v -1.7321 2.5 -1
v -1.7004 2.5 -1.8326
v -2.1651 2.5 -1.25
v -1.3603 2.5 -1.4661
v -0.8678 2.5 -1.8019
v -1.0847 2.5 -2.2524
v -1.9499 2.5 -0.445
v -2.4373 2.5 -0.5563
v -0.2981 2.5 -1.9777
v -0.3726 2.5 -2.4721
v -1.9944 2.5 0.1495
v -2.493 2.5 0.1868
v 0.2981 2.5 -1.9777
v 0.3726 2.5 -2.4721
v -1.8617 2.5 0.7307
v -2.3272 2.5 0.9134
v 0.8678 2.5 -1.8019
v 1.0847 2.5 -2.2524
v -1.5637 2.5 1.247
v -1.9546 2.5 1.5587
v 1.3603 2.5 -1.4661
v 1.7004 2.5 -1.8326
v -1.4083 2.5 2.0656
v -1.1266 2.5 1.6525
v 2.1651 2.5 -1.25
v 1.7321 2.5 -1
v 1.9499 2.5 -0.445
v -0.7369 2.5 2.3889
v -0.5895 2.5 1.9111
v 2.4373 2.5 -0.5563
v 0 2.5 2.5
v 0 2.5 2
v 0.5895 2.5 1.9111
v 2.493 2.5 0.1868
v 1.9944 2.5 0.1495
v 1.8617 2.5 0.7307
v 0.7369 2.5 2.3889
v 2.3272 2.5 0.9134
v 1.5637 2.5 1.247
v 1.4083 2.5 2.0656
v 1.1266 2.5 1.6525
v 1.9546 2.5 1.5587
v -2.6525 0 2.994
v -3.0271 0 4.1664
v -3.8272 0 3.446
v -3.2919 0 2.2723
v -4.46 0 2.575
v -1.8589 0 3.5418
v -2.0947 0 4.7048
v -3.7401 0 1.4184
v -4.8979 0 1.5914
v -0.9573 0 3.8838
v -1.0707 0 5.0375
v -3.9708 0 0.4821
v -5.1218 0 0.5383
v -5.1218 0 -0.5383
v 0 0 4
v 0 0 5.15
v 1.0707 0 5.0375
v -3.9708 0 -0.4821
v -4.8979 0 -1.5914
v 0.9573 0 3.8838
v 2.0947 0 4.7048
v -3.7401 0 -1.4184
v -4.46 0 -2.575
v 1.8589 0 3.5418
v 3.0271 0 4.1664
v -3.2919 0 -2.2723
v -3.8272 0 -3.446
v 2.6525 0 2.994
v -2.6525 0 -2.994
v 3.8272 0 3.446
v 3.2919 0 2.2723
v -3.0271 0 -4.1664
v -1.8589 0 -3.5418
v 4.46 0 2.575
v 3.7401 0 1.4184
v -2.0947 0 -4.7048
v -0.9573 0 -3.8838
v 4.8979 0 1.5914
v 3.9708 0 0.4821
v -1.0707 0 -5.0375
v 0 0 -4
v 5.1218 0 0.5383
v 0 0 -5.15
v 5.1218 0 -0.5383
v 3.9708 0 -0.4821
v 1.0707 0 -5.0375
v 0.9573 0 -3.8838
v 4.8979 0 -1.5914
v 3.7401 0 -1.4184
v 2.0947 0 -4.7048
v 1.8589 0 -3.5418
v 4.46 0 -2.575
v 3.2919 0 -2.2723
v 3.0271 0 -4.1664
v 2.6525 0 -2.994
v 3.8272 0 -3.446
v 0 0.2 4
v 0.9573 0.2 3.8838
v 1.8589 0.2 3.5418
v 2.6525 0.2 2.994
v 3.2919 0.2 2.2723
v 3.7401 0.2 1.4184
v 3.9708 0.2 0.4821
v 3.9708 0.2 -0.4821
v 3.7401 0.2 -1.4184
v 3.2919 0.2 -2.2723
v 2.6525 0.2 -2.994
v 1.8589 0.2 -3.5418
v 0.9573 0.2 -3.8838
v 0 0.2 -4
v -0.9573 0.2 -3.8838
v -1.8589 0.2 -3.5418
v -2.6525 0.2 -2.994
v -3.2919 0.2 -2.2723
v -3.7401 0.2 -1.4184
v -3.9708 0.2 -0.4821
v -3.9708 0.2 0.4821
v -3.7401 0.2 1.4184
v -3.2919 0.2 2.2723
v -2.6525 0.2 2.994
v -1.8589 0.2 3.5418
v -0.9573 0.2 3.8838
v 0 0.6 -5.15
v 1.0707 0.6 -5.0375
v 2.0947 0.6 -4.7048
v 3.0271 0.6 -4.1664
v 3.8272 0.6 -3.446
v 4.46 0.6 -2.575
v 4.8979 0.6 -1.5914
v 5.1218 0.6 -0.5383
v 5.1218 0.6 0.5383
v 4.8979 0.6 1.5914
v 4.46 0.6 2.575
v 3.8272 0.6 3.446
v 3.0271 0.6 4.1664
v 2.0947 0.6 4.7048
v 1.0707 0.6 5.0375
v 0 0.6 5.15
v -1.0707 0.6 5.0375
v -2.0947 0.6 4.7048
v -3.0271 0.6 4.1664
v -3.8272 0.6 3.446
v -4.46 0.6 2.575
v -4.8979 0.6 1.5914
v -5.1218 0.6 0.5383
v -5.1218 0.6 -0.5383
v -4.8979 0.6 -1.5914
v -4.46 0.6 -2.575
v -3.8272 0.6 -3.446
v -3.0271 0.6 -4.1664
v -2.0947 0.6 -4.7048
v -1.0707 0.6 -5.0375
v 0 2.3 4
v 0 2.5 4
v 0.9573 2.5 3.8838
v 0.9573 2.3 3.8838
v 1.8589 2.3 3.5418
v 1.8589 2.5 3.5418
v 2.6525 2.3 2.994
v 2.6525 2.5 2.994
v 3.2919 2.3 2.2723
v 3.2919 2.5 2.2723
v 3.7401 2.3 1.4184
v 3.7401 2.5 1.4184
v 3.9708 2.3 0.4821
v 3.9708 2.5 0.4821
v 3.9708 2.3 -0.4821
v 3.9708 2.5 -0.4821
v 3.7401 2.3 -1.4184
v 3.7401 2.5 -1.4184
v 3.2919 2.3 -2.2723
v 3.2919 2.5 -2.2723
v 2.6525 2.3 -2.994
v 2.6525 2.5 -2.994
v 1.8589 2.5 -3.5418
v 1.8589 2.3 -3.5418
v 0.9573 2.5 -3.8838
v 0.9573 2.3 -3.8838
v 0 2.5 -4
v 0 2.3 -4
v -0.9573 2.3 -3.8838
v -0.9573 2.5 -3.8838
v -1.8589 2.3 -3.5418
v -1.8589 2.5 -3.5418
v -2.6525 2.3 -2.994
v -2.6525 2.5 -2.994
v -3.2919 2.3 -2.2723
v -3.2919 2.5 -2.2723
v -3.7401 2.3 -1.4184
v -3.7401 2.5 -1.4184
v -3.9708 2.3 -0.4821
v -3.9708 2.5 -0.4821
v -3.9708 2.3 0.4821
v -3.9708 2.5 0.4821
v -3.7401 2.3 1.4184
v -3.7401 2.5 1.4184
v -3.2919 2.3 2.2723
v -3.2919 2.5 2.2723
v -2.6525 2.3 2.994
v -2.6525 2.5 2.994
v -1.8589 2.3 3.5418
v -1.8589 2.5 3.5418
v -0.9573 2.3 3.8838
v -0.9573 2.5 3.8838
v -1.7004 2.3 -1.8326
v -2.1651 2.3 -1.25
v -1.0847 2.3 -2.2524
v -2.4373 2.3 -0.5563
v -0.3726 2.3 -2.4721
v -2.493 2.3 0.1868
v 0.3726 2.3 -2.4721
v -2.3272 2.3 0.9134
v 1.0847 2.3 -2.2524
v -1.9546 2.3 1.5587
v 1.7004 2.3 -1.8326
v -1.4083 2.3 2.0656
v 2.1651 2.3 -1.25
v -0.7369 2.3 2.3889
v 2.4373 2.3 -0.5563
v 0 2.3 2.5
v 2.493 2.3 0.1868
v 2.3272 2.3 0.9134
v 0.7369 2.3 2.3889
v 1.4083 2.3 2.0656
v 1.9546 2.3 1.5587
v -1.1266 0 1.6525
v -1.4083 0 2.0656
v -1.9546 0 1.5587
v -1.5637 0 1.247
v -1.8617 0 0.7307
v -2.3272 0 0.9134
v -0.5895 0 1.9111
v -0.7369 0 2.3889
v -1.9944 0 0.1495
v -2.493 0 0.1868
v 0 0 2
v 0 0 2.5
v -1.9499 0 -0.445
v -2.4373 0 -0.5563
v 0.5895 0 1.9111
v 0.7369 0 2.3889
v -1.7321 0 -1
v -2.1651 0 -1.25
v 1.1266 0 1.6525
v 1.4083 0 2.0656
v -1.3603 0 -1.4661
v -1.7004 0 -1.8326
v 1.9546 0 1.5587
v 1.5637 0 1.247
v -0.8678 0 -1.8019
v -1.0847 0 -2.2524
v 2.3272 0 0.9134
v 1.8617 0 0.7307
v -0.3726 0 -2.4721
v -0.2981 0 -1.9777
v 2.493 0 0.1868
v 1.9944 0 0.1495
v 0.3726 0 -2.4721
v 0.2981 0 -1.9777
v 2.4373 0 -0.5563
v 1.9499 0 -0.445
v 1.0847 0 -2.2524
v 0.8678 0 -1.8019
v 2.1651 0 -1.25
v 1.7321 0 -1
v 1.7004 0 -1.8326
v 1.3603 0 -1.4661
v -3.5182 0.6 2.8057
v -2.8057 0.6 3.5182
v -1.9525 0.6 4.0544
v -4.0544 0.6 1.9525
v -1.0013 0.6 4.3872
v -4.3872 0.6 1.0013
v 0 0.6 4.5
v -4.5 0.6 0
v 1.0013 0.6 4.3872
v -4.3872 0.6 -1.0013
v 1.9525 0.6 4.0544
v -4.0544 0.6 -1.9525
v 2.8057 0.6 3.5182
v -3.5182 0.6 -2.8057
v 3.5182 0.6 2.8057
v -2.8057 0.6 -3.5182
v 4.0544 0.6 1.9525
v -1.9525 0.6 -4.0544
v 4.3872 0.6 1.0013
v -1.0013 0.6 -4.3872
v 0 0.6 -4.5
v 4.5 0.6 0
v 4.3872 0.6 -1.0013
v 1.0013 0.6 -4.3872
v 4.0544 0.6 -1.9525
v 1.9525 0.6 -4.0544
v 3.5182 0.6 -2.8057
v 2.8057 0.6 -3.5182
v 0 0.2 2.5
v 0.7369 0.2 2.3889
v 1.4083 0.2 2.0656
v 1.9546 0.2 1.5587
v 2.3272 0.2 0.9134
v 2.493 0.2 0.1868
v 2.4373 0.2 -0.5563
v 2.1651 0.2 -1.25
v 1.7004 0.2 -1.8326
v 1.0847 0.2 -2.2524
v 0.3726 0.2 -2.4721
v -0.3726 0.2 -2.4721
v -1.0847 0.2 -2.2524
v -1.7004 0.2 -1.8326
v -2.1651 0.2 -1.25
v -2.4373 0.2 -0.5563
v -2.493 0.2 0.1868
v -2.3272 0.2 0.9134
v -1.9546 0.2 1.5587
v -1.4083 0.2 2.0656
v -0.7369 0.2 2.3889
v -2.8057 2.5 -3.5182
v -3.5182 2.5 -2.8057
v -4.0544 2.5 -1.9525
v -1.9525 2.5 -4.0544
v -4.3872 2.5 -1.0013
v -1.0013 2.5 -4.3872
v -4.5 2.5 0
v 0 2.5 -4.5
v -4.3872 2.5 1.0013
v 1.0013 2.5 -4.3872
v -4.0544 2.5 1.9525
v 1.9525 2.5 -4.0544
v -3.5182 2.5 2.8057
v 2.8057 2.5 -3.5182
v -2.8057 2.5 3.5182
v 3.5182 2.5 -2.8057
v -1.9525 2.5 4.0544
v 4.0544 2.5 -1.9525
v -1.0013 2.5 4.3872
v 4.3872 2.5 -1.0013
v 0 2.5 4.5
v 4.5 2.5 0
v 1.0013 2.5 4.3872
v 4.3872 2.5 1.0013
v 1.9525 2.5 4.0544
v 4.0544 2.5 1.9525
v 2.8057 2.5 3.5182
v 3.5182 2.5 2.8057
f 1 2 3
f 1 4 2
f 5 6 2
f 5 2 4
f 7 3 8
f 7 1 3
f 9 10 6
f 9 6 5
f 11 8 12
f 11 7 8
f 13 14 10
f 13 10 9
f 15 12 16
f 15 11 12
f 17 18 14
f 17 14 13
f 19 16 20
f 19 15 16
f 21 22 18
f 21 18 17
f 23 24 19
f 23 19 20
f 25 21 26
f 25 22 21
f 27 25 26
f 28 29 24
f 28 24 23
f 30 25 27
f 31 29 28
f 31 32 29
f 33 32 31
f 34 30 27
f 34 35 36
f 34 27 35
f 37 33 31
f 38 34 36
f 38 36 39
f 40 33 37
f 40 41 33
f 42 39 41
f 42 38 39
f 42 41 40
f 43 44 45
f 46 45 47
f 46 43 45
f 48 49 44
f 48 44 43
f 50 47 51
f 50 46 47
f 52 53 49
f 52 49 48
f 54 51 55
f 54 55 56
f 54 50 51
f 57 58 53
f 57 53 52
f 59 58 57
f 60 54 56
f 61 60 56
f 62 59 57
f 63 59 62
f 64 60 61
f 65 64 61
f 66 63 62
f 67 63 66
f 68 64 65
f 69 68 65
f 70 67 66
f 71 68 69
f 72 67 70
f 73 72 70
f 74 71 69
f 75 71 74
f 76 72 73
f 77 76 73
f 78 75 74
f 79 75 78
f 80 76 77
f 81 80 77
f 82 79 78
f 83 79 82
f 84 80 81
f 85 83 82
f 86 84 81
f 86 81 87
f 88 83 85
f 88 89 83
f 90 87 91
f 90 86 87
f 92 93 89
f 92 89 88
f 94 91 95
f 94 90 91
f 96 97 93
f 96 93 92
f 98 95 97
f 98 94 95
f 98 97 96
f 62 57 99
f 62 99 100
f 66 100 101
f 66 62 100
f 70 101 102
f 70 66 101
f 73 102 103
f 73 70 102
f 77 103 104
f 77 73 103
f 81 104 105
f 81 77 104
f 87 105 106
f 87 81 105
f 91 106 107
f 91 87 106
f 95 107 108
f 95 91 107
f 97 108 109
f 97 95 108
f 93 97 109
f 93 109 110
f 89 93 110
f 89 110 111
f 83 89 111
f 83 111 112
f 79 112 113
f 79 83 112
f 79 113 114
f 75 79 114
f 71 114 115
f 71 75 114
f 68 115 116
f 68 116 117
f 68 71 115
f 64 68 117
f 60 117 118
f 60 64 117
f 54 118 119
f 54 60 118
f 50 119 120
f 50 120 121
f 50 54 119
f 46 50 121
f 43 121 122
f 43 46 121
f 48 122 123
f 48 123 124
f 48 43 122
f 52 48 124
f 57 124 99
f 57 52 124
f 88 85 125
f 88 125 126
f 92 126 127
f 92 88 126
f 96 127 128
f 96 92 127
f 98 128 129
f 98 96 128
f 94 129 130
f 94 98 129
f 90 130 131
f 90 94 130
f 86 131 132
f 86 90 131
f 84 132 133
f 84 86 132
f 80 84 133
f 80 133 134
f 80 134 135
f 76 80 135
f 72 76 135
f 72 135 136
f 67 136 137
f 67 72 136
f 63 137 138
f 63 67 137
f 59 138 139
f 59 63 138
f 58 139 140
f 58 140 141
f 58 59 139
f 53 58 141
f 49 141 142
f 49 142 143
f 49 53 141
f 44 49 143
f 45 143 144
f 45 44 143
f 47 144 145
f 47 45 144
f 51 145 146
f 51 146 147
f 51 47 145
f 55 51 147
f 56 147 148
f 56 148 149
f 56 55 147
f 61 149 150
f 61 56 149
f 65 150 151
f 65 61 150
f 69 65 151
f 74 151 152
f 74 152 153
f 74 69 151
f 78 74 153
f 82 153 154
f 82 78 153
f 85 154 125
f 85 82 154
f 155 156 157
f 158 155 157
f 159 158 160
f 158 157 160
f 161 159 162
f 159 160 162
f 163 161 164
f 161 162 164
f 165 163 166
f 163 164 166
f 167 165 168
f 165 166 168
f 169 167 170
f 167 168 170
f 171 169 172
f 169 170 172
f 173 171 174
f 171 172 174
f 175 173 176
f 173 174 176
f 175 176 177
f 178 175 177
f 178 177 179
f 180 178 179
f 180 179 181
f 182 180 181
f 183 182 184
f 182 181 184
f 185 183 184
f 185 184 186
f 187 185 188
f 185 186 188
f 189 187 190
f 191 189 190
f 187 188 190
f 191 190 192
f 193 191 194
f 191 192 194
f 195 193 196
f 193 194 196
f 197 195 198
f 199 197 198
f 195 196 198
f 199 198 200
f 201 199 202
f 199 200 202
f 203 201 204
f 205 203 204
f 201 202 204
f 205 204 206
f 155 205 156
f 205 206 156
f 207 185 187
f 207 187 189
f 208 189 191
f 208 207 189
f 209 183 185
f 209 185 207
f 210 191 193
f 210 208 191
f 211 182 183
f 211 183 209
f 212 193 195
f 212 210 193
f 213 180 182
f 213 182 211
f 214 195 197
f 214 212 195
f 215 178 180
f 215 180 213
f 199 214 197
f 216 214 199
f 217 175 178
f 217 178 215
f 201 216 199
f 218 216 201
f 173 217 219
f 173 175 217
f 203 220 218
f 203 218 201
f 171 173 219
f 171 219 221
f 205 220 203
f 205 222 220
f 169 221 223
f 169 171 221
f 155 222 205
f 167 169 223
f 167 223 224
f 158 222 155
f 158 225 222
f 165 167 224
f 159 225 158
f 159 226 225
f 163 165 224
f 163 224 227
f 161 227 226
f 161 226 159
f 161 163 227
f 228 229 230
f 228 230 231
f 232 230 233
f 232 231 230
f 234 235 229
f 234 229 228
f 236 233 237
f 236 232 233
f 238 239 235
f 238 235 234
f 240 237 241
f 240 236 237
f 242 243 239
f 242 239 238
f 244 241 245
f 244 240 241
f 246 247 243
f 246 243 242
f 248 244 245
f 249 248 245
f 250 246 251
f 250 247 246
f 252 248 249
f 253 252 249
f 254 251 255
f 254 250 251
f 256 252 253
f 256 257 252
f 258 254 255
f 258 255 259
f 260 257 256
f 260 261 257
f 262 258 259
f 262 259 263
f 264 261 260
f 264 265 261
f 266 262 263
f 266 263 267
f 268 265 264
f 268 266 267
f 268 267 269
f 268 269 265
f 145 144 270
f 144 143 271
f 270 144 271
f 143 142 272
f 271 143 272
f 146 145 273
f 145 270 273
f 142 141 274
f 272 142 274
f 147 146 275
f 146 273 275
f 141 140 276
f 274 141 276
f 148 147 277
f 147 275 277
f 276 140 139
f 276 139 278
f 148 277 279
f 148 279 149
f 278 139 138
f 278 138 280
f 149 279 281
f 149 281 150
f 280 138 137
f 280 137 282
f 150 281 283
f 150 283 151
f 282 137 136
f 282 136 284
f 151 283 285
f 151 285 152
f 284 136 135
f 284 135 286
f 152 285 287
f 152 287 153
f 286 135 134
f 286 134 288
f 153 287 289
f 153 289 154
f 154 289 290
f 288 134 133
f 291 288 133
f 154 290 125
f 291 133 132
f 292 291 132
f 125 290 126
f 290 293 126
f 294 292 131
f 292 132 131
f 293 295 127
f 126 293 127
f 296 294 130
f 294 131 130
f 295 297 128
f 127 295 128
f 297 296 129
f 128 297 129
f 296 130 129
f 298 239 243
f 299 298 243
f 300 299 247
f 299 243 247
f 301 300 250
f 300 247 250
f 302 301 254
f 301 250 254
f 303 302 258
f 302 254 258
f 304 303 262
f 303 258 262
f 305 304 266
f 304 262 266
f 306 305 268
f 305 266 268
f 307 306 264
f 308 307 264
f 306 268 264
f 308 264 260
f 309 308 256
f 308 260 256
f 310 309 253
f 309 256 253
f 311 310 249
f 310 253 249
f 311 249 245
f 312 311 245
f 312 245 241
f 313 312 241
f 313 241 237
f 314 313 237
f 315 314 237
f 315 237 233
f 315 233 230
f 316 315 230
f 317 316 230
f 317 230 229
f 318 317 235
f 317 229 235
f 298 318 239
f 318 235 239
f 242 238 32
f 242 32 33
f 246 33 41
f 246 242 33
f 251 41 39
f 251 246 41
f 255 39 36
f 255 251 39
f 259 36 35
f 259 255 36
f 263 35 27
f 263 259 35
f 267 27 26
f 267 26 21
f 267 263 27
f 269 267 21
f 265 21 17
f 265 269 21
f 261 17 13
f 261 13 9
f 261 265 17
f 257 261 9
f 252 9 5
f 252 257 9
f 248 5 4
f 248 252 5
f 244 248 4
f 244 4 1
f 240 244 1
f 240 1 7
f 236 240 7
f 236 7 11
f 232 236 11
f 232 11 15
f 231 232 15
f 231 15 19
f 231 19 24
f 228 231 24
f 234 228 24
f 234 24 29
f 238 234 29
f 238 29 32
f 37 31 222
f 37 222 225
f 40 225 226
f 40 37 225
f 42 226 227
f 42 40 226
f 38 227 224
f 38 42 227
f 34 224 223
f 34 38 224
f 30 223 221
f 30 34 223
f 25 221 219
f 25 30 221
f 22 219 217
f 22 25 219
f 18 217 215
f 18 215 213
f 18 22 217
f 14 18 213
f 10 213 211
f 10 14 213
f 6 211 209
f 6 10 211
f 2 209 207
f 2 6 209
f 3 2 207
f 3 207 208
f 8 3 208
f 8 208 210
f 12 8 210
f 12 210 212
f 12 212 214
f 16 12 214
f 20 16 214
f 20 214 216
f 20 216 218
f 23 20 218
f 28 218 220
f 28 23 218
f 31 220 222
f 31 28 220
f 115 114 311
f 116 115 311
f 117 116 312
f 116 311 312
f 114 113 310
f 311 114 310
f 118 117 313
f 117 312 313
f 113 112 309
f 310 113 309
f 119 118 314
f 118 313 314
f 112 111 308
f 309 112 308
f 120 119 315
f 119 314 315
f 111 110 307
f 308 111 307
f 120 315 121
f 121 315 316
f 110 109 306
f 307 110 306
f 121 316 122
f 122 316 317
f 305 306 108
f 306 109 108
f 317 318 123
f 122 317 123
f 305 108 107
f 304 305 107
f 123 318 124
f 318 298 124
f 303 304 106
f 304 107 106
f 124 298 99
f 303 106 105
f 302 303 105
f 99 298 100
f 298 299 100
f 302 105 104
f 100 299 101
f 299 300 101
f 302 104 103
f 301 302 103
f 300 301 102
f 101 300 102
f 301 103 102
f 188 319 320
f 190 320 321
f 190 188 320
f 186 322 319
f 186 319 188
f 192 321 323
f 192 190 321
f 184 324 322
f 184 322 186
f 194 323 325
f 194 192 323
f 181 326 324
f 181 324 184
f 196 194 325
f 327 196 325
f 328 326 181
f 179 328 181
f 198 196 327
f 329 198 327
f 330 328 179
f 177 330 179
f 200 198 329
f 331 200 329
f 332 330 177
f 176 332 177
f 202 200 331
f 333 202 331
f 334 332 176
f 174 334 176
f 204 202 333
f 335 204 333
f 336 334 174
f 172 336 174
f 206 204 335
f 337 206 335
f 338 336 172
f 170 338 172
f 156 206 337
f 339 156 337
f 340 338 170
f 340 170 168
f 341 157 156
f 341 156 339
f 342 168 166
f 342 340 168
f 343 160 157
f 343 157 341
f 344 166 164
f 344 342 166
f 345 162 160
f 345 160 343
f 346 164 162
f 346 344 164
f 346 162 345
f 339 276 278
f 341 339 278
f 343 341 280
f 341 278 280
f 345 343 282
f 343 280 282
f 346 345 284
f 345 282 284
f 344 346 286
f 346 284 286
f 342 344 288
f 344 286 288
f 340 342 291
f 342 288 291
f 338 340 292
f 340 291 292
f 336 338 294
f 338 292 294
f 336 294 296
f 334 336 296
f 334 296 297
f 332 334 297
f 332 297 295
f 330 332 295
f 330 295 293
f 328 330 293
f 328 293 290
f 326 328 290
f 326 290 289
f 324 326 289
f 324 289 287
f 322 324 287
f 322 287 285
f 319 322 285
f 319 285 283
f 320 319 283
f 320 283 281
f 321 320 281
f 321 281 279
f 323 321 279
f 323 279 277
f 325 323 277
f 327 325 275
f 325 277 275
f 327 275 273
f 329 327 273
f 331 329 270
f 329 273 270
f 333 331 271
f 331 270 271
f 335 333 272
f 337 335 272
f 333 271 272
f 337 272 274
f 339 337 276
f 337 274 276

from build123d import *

# Parameters (mm, degrees)
SKETCH_1_R          = 4.5
SKETCH_1_R_2        = 2
EXTRUDE_1_DEPTH     = 2.5
SKETCH_2_R          = 5.15
SKETCH_2_R_2        = 2
EXTRUDE_2_DEPTH     = 0.6
SKETCH_4_R          = 4
SKETCH_4_R_2        = 2.5
CUT_EXTRUDE_1_DEPTH = 0.2


with BuildPart() as part:
    # 草图1 → 凸台-拉伸1 (new body)
    with BuildSketch(Plane(origin=(0, 0, 0), x_dir=(1, 0, 0), z_dir=(0, 1, 0))):
        with Locations(Location((0, 0, 0), (0, 0, 270))):
            Circle(SKETCH_1_R)
        with Locations(Location((0, 0, 0), (0, 0, 270))):
            Circle(SKETCH_1_R_2, mode=Mode.SUBTRACT)
    extrude(amount=EXTRUDE_1_DEPTH)

    # 草图2 → 凸台-拉伸2 (add)
    with BuildSketch(Plane.XZ):
        with Locations(Location((0, 0, 0), (0, 0, 270))):
            Circle(SKETCH_2_R)
        with Locations(Location((0, 0, 0), (0, 0, 90))):
            Circle(SKETCH_2_R_2, mode=Mode.SUBTRACT)
    extrude(amount=-EXTRUDE_2_DEPTH)

    # 草图4 → 切除-拉伸1 (cut)
    with BuildSketch(Plane(origin=(0, 2.5, 0), x_dir=(1, 0, 0), z_dir=(0, 1, 0))):
        with Locations(Location((0, 0, 0), (0, 0, 270))):
            Circle(SKETCH_4_R)
        with Locations(Location((0, 0, 0), (0, 0, 270))):
            Circle(SKETCH_4_R_2, mode=Mode.SUBTRACT)
    cut_extrude_1 = extrude(amount=-CUT_EXTRUDE_1_DEPTH, mode=Mode.SUBTRACT)

    # 镜向1: 切除-拉伸1 across plane
    add(cut_extrude_1.mirror(Plane(origin=(0, 1.25, 0), x_dir=(0, 0, 1), z_dir=(0, -1, 0))), mode=Mode.SUBTRACT)


solid = part.part
